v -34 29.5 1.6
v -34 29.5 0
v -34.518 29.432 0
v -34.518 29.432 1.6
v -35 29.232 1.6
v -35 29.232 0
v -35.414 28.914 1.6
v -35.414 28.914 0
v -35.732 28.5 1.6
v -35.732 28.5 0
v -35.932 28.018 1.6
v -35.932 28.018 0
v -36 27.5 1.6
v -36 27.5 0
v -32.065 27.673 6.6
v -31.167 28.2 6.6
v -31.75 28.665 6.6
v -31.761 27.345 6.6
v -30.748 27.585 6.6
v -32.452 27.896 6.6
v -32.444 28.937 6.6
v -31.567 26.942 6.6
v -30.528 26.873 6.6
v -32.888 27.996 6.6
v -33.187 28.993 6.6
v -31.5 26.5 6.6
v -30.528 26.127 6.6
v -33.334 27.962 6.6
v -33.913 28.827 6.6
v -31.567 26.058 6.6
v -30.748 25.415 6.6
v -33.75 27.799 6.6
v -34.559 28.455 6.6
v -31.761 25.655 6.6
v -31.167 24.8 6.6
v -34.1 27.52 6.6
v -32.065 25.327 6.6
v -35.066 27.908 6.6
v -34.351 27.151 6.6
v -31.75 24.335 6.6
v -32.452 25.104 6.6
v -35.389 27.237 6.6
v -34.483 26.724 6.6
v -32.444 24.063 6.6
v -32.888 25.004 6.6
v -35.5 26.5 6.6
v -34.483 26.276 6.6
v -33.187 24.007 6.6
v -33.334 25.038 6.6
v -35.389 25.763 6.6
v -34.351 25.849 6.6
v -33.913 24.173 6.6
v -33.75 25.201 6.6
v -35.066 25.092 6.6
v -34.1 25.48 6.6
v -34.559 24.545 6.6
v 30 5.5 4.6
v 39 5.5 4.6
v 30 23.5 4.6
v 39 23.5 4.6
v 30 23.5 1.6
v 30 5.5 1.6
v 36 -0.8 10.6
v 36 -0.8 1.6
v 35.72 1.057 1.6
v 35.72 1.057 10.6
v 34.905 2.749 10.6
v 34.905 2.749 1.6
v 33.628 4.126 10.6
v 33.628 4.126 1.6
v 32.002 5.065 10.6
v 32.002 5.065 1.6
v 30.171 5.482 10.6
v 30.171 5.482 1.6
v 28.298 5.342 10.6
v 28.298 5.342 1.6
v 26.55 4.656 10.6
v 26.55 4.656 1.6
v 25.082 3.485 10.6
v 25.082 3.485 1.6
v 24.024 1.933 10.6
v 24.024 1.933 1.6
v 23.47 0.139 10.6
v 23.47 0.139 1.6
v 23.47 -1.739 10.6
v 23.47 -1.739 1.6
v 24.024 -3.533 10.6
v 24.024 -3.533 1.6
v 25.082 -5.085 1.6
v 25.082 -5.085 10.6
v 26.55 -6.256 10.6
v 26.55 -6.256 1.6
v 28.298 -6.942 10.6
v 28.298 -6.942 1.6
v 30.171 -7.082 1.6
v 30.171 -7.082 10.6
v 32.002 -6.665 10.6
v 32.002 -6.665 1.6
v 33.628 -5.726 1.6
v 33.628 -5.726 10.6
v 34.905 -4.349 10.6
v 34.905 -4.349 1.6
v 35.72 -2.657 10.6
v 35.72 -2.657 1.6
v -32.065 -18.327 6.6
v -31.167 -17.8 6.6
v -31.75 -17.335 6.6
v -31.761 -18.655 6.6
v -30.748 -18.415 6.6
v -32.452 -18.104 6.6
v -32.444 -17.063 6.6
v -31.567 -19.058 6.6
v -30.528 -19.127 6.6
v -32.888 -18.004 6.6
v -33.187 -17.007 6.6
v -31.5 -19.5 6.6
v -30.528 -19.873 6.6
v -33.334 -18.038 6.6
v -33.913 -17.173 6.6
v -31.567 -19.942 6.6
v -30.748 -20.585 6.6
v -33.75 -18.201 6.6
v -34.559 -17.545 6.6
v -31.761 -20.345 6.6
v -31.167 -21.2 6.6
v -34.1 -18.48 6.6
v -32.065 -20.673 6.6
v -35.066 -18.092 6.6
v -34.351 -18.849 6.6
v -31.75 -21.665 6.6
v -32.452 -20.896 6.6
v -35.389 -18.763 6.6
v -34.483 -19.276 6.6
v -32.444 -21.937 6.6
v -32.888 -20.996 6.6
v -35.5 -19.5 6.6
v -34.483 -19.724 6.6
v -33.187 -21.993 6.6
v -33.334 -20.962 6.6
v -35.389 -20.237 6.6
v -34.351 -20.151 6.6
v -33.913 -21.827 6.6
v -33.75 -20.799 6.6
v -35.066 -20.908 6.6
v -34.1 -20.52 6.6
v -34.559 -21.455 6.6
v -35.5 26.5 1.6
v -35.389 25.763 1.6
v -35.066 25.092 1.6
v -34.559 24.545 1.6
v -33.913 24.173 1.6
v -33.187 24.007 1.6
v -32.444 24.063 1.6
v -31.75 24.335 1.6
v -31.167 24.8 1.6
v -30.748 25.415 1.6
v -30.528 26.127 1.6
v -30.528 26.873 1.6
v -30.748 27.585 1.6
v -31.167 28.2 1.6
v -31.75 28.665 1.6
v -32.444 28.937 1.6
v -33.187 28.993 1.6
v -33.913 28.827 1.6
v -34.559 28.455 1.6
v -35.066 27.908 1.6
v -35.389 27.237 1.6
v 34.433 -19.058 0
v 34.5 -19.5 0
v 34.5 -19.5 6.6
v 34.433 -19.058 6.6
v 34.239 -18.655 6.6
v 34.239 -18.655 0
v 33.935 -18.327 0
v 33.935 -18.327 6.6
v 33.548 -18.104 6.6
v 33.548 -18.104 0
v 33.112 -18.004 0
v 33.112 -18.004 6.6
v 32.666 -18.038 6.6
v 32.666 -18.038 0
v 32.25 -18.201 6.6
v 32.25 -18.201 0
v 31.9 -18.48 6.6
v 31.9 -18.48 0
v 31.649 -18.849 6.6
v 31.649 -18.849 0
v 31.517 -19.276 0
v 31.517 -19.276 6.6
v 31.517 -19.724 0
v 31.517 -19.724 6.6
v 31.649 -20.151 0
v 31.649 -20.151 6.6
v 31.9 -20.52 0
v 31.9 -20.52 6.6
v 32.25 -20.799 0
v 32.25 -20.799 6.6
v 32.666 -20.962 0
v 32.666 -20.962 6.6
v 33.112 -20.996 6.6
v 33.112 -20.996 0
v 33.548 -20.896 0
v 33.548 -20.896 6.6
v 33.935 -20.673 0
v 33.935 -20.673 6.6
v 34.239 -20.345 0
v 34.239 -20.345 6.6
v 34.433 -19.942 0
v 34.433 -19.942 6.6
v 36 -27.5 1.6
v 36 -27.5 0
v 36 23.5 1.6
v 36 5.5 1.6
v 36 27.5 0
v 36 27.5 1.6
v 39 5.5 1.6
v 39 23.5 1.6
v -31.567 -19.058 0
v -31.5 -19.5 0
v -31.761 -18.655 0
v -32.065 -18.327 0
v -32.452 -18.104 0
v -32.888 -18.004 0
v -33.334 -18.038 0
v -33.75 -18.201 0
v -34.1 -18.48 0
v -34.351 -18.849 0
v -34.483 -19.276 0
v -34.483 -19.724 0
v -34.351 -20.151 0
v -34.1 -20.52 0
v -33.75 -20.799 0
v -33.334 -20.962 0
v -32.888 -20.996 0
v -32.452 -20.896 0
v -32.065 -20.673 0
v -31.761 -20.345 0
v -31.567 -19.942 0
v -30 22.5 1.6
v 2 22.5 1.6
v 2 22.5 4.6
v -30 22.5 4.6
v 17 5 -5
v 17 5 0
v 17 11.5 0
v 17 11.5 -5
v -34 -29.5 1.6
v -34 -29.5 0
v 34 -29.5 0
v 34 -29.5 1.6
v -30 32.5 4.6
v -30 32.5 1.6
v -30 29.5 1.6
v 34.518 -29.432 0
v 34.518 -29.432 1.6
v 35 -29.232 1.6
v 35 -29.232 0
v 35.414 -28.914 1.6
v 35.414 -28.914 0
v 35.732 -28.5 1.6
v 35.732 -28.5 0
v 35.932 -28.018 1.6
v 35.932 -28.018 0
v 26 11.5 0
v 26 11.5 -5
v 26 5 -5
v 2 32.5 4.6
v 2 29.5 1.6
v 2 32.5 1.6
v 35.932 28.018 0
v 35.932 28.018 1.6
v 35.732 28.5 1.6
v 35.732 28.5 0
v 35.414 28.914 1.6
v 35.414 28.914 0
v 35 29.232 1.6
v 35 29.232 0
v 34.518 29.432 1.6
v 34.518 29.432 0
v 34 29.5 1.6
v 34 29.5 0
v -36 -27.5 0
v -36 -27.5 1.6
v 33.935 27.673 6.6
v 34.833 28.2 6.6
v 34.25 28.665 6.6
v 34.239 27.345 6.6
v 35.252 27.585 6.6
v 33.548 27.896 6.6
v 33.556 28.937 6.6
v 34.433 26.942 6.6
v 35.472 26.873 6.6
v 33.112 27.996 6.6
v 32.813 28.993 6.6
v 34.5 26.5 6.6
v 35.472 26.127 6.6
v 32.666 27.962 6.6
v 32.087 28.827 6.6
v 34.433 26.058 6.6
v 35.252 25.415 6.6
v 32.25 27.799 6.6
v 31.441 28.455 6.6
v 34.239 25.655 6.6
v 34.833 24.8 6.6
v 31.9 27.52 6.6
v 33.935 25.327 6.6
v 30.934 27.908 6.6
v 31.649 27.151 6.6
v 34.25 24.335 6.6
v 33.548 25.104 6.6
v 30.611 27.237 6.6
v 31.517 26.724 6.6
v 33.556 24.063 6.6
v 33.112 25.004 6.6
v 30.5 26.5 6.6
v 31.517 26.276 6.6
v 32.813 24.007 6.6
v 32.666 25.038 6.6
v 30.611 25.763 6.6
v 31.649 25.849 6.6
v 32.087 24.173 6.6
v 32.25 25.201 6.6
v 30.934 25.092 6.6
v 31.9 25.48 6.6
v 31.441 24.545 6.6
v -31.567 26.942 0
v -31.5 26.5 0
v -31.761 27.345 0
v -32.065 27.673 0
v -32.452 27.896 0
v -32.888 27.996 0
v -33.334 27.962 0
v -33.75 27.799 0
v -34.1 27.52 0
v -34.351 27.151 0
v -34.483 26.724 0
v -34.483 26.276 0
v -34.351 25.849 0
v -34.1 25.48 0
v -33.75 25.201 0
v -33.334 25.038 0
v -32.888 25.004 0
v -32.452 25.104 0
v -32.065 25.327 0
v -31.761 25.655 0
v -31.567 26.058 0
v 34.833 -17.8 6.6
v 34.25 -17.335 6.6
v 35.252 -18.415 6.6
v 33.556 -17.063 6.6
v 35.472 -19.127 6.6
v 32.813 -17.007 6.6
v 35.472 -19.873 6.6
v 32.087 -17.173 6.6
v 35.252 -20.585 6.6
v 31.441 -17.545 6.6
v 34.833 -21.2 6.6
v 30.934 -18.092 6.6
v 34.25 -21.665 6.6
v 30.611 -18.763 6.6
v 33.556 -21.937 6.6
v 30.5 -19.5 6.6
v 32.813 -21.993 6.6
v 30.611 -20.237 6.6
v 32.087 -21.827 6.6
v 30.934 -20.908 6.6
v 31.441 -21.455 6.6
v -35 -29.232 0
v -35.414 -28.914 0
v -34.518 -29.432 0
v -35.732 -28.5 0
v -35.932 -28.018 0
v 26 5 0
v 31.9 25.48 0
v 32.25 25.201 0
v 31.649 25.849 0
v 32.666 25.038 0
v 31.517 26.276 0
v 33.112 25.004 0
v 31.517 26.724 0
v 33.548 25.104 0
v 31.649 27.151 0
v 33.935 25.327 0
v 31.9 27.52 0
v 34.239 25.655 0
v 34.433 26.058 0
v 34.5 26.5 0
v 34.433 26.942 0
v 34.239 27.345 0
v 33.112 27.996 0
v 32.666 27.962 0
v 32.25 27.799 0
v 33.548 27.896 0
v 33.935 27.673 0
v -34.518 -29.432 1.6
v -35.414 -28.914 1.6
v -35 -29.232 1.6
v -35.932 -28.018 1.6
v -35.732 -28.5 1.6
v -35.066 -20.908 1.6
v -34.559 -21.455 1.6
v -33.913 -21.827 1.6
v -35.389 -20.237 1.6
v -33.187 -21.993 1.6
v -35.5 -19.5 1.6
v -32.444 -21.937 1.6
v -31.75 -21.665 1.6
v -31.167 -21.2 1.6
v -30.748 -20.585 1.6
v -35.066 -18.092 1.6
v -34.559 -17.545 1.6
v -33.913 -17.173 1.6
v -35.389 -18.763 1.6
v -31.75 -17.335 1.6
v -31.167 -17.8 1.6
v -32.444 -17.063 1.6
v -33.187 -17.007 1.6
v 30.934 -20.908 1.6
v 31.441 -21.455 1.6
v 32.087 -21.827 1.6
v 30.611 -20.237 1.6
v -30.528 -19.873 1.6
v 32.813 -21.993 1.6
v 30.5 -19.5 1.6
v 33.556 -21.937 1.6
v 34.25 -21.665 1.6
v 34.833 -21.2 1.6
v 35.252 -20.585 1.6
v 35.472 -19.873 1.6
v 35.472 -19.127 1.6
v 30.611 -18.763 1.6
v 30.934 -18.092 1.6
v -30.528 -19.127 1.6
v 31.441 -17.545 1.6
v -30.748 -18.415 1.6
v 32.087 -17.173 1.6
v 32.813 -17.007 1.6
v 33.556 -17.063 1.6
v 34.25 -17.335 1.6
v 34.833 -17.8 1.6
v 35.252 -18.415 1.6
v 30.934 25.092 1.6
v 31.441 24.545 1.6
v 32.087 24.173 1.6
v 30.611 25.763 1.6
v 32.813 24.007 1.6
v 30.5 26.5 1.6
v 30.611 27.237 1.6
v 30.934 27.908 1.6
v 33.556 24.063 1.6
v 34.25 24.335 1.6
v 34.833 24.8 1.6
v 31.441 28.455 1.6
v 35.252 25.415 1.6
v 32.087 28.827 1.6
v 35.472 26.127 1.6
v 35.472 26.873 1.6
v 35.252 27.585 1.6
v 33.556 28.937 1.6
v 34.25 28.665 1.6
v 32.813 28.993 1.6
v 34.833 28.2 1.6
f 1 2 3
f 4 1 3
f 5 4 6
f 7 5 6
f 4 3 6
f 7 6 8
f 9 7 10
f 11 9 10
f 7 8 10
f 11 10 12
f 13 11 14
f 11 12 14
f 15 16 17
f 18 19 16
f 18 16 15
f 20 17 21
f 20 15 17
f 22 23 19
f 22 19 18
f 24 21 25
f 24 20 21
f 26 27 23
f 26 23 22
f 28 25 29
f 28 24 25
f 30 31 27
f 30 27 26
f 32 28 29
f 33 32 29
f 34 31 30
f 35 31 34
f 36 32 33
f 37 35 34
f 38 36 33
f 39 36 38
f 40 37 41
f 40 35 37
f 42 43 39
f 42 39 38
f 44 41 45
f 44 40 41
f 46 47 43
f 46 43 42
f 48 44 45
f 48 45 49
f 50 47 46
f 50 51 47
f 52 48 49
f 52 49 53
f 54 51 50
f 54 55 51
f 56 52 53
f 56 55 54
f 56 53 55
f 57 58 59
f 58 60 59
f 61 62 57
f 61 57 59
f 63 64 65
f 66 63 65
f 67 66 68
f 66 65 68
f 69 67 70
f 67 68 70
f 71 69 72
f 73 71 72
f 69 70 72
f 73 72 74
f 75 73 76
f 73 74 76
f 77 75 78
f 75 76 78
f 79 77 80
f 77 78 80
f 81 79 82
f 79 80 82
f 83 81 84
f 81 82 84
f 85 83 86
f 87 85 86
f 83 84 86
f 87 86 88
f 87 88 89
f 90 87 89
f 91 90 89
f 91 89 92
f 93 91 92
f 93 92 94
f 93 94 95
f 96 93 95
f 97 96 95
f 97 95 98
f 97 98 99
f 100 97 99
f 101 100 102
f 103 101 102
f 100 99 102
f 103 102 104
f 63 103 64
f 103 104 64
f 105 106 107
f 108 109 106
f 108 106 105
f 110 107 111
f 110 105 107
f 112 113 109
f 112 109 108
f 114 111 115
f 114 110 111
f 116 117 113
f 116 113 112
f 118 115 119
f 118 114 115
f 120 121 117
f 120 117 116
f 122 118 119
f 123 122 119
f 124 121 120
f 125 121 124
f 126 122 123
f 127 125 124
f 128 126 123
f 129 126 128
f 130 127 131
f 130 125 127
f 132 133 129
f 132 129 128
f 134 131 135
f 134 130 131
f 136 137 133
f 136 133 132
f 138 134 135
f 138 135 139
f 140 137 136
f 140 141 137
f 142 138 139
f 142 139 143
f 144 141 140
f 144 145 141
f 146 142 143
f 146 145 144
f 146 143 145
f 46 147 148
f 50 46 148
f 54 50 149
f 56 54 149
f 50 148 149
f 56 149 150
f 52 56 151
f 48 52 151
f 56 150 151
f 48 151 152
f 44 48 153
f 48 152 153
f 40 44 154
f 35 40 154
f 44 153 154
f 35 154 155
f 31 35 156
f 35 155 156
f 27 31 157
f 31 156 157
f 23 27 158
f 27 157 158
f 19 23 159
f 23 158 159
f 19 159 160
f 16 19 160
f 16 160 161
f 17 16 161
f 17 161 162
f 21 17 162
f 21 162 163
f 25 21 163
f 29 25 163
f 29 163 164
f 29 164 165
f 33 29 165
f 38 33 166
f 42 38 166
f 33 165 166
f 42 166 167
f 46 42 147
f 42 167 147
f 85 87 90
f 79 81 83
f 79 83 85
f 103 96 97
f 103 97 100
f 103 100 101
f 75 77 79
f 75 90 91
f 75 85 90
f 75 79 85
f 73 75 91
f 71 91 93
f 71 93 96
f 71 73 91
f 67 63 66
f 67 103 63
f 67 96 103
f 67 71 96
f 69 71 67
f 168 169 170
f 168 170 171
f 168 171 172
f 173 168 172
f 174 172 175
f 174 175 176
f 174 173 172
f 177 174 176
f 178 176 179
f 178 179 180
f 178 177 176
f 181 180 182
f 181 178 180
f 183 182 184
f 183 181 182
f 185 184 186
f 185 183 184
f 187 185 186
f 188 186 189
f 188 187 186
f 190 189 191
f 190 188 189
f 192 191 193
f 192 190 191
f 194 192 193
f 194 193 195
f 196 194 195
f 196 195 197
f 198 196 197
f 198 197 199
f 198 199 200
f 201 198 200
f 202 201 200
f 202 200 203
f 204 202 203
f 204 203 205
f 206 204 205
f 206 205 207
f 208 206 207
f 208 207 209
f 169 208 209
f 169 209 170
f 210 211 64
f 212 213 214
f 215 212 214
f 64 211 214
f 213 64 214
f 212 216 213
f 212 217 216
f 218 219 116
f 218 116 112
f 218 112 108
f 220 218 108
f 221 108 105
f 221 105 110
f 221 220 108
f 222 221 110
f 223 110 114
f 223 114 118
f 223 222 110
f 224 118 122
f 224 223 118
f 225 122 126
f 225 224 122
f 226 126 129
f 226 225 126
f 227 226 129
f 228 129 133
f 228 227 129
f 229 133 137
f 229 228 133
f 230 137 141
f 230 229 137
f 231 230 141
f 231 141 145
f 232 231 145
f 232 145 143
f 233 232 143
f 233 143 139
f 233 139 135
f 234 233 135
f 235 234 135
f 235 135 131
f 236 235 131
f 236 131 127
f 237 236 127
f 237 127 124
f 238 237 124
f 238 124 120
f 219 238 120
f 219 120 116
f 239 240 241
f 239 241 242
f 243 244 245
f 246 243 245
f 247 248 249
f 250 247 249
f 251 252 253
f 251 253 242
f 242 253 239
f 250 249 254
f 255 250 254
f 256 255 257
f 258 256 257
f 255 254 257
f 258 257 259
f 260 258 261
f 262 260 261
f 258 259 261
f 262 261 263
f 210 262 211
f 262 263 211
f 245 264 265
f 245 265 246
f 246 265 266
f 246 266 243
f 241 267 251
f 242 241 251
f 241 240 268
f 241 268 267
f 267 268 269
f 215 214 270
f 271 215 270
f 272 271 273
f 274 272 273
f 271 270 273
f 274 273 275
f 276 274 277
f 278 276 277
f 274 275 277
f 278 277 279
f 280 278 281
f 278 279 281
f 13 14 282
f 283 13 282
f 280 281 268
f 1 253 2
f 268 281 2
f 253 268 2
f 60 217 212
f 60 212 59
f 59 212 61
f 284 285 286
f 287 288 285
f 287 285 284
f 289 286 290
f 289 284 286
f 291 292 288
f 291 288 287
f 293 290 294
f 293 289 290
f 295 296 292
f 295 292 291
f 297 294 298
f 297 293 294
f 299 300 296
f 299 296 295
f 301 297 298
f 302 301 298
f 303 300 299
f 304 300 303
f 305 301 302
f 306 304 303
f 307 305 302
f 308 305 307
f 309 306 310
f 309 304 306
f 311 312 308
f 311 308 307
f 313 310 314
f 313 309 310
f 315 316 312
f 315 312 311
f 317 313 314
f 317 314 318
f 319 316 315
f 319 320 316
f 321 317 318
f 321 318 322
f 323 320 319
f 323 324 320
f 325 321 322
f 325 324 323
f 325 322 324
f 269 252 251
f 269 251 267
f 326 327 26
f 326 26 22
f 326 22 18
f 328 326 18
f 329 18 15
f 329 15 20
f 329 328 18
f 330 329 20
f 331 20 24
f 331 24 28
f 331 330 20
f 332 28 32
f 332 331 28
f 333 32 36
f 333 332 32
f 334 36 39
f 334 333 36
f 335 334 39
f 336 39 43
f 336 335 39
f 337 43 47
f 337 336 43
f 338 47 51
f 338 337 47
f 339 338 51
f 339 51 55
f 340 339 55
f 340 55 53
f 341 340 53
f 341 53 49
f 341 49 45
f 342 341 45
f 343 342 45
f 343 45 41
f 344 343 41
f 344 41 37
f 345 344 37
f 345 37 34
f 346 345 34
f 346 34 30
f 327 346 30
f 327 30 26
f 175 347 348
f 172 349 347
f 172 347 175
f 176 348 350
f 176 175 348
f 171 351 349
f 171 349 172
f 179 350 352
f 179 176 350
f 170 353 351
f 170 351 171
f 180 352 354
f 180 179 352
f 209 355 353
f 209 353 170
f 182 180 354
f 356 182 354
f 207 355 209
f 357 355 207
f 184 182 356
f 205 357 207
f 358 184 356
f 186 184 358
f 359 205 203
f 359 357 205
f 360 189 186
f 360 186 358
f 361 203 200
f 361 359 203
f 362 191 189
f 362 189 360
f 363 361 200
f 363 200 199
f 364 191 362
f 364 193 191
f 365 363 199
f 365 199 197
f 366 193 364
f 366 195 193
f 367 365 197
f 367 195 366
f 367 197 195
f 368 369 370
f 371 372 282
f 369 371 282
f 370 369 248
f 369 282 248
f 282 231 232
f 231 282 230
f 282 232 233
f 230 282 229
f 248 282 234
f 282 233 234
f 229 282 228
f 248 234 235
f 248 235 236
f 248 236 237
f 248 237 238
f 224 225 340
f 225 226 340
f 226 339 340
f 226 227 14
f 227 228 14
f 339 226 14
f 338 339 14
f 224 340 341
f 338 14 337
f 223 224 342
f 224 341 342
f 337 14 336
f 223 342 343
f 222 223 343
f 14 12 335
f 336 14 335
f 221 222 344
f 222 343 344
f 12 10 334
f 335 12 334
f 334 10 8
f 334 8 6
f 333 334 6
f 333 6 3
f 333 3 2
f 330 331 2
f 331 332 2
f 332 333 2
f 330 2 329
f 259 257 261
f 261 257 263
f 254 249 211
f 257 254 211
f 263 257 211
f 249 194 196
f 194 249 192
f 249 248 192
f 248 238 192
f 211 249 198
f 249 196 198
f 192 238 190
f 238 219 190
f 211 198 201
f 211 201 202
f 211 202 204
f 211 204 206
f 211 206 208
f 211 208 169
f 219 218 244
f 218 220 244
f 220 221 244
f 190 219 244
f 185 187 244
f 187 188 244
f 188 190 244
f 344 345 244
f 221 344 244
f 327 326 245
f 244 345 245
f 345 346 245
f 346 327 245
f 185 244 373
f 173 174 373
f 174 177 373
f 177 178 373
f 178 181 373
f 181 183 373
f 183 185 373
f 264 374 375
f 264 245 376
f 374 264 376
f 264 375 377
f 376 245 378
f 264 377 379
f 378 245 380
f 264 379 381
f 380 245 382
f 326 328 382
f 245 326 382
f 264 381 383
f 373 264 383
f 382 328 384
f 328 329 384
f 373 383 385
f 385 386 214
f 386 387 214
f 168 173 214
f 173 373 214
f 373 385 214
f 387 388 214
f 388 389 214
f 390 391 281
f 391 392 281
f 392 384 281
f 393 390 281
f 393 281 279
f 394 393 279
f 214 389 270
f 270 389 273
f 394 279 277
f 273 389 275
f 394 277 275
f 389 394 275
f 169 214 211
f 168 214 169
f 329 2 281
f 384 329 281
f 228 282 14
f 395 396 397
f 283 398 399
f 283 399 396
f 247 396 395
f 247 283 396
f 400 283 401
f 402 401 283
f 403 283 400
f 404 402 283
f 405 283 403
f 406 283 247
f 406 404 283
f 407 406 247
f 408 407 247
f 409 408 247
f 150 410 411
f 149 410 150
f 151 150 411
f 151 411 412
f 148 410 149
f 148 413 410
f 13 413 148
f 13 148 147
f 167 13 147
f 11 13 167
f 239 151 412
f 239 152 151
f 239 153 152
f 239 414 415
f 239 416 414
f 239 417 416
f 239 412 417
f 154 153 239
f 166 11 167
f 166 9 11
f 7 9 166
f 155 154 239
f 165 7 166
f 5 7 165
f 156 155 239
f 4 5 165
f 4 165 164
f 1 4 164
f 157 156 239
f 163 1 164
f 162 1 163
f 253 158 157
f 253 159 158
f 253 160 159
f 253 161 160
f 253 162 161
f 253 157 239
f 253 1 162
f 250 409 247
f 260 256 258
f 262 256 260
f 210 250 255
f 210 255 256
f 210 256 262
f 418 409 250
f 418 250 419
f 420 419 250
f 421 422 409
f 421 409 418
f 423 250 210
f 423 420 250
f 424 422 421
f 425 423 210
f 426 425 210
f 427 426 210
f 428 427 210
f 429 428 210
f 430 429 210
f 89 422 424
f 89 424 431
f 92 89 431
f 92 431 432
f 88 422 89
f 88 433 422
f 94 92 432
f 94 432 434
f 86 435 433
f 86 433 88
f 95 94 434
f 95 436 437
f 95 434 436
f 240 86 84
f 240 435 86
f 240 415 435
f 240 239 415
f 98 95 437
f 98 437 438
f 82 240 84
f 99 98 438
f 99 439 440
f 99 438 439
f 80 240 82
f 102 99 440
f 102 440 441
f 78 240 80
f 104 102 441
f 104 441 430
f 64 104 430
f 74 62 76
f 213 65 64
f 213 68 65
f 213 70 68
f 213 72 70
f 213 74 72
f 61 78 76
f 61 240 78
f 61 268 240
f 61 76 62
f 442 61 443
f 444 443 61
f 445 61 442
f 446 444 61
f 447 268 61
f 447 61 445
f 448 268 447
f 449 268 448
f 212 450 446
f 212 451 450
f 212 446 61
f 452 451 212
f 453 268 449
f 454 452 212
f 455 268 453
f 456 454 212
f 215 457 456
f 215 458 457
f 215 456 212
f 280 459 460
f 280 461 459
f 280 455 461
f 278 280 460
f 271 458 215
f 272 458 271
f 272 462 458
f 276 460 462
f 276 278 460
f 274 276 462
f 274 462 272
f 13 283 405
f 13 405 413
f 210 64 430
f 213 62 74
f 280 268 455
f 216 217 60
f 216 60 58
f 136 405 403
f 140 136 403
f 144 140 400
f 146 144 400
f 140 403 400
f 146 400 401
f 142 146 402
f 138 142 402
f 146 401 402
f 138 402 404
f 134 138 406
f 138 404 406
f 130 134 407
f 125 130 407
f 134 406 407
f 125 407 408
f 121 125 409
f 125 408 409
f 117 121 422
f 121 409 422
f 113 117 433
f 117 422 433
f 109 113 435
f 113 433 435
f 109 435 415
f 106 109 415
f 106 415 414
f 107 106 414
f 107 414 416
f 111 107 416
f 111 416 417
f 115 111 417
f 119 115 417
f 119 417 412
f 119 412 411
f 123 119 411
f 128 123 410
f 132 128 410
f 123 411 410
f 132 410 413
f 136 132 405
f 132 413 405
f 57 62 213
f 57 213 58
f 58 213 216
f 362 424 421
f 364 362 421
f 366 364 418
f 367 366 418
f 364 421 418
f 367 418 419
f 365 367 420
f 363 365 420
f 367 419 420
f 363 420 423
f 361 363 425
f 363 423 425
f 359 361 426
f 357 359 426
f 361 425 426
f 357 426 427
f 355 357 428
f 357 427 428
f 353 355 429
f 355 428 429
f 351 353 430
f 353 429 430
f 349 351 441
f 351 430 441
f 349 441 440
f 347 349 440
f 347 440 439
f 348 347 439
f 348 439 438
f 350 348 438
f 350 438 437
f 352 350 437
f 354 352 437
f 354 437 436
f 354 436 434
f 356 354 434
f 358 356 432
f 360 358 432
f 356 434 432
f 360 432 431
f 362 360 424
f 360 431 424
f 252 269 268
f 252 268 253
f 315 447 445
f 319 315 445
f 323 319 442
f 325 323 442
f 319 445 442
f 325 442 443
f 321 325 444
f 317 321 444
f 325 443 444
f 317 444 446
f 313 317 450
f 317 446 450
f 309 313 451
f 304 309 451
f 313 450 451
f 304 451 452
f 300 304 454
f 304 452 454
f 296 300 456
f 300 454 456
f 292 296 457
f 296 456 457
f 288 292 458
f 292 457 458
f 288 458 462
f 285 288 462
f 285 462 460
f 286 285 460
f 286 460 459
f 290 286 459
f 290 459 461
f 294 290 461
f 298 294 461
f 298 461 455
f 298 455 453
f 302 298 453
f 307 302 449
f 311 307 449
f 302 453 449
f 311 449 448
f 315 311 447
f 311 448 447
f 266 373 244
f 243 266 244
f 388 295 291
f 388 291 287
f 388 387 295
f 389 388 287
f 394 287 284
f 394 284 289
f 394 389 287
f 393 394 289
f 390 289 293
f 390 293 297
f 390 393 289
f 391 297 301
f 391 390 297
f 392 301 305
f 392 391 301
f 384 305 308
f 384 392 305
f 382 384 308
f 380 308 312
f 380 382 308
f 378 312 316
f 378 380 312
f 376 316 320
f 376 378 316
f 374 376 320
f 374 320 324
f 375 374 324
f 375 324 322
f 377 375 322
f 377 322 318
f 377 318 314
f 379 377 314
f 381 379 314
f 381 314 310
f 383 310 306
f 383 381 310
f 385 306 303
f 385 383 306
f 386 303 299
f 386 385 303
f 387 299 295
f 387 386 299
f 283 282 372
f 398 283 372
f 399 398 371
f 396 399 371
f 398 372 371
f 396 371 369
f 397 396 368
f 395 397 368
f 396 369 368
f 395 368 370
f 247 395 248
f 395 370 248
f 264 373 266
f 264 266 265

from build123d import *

# Parameters (mm, degrees)
SKETCH_1_R      = 1.5
EXTRUDE_1_DEPTH = 1.6
SKETCH_2_R      = 2.5
SKETCH_2_R_2    = 1.5
EXTRUDE_2_DEPTH = 5
SKETCH_3_R      = 6.3
EXTRUDE_3_DEPTH = 9
EXTRUDE_4_DEPTH = 3
SKETCH_5_W      = 9
SKETCH_5_H      = 6.5
EXTRUDE_5_DEPTH = 5


with BuildPart() as part:
    # 草图1 → 凸台-拉伸1 (new body)
    with BuildSketch(Plane.XY):
        with BuildLine():
            Line((-34, -29.5), (34, -29.5))
            ThreePointArc((34, -29.5), (35.414213562, -28.914213562), (36, -27.5))
            Line((36, -27.5), (36, 27.5))
            ThreePointArc((36, 27.5), (35.414213562, 28.914213562), (34, 29.5))
            Line((34, 29.5), (-34, 29.5))
            ThreePointArc((-34, 29.5), (-35.414213562, 28.914213562), (-36, 27.5))
            Line((-36, 27.5), (-36, -27.5))
            ThreePointArc((-36, -27.5), (-35.414213562, -28.914213562), (-34, -29.5))
        make_face()
        with Locations((-33, 26.5)):
            Circle(SKETCH_1_R, mode=Mode.SUBTRACT)
        with Locations((33, 26.5)):
            Circle(SKETCH_1_R, mode=Mode.SUBTRACT)
        with Locations((33, -19.5)):
            Circle(SKETCH_1_R, mode=Mode.SUBTRACT)
        with Locations((-33, -19.5)):
            Circle(SKETCH_1_R, mode=Mode.SUBTRACT)
    extrude(amount=EXTRUDE_1_DEPTH)

    # 草图2 → 凸台-拉伸2 (add)
    # profile 1 of 4: a face of its own
    with BuildSketch(Plane.XY.offset(1.6)):
        with Locations(Location((33, 26.5, 0), (0, 0, 180))):
            Circle(SKETCH_2_R)
        with Locations((33, 26.5)):
            Circle(SKETCH_2_R_2, mode=Mode.SUBTRACT)
    # profile 2 of 4: a face of its own
    with BuildSketch(Plane.XY.offset(1.6)):
        with Locations(Location((-33, 26.5, 0), (0, 0, 180))):
            Circle(SKETCH_2_R)
        with Locations((-33, 26.5)):
            Circle(SKETCH_2_R_2, mode=Mode.SUBTRACT)
    # profile 3 of 4: a face of its own
    with BuildSketch(Plane.XY.offset(1.6)):
        with Locations(Location((-33, -19.5, 0), (0, 0, 180))):
            Circle(SKETCH_2_R)
        with Locations((-33, -19.5)):
            Circle(SKETCH_2_R_2, mode=Mode.SUBTRACT)
    # profile 4 of 4: a face of its own
    with BuildSketch(Plane.XY.offset(1.6)):
        with Locations(Location((33, -19.5, 0), (0, 0, 180))):
            Circle(SKETCH_2_R)
        with Locations((33, -19.5)):
            Circle(SKETCH_2_R_2, mode=Mode.SUBTRACT)
    extrude(amount=EXTRUDE_2_DEPTH)

    # 草图3 → 凸台-拉伸3 (add)
    with BuildSketch(Plane.XY.offset(1.6)):
        with Locations((29.7, -0.8)):
            Circle(SKETCH_3_R)
    extrude(amount=EXTRUDE_3_DEPTH)

    # 草图4 → 凸台-拉伸4 (add)
    with BuildSketch(Plane.XY.offset(1.6)):
        Polygon((36, 5.5), (30, 5.5), (30, 23.5), (36, 23.5), (39, 23.5), (39, 5.5), align=None)
        Polygon((2, 29.5), (2, 22.5), (-30, 22.5), (-30, 29.5), (-30, 32.5), (2, 32.5), align=None)
    extrude(amount=EXTRUDE_4_DEPTH)

    # 草图5 → 凸台-拉伸5 (add)
    with BuildSketch(Plane(origin=(0, 0, 0), x_dir=(-1, 0, 0), z_dir=(0, 0, -1))):
        with Locations((-21.5, 8.25)):
            Rectangle(SKETCH_5_W, SKETCH_5_H)
    extrude(amount=EXTRUDE_5_DEPTH)


solid = part.part
